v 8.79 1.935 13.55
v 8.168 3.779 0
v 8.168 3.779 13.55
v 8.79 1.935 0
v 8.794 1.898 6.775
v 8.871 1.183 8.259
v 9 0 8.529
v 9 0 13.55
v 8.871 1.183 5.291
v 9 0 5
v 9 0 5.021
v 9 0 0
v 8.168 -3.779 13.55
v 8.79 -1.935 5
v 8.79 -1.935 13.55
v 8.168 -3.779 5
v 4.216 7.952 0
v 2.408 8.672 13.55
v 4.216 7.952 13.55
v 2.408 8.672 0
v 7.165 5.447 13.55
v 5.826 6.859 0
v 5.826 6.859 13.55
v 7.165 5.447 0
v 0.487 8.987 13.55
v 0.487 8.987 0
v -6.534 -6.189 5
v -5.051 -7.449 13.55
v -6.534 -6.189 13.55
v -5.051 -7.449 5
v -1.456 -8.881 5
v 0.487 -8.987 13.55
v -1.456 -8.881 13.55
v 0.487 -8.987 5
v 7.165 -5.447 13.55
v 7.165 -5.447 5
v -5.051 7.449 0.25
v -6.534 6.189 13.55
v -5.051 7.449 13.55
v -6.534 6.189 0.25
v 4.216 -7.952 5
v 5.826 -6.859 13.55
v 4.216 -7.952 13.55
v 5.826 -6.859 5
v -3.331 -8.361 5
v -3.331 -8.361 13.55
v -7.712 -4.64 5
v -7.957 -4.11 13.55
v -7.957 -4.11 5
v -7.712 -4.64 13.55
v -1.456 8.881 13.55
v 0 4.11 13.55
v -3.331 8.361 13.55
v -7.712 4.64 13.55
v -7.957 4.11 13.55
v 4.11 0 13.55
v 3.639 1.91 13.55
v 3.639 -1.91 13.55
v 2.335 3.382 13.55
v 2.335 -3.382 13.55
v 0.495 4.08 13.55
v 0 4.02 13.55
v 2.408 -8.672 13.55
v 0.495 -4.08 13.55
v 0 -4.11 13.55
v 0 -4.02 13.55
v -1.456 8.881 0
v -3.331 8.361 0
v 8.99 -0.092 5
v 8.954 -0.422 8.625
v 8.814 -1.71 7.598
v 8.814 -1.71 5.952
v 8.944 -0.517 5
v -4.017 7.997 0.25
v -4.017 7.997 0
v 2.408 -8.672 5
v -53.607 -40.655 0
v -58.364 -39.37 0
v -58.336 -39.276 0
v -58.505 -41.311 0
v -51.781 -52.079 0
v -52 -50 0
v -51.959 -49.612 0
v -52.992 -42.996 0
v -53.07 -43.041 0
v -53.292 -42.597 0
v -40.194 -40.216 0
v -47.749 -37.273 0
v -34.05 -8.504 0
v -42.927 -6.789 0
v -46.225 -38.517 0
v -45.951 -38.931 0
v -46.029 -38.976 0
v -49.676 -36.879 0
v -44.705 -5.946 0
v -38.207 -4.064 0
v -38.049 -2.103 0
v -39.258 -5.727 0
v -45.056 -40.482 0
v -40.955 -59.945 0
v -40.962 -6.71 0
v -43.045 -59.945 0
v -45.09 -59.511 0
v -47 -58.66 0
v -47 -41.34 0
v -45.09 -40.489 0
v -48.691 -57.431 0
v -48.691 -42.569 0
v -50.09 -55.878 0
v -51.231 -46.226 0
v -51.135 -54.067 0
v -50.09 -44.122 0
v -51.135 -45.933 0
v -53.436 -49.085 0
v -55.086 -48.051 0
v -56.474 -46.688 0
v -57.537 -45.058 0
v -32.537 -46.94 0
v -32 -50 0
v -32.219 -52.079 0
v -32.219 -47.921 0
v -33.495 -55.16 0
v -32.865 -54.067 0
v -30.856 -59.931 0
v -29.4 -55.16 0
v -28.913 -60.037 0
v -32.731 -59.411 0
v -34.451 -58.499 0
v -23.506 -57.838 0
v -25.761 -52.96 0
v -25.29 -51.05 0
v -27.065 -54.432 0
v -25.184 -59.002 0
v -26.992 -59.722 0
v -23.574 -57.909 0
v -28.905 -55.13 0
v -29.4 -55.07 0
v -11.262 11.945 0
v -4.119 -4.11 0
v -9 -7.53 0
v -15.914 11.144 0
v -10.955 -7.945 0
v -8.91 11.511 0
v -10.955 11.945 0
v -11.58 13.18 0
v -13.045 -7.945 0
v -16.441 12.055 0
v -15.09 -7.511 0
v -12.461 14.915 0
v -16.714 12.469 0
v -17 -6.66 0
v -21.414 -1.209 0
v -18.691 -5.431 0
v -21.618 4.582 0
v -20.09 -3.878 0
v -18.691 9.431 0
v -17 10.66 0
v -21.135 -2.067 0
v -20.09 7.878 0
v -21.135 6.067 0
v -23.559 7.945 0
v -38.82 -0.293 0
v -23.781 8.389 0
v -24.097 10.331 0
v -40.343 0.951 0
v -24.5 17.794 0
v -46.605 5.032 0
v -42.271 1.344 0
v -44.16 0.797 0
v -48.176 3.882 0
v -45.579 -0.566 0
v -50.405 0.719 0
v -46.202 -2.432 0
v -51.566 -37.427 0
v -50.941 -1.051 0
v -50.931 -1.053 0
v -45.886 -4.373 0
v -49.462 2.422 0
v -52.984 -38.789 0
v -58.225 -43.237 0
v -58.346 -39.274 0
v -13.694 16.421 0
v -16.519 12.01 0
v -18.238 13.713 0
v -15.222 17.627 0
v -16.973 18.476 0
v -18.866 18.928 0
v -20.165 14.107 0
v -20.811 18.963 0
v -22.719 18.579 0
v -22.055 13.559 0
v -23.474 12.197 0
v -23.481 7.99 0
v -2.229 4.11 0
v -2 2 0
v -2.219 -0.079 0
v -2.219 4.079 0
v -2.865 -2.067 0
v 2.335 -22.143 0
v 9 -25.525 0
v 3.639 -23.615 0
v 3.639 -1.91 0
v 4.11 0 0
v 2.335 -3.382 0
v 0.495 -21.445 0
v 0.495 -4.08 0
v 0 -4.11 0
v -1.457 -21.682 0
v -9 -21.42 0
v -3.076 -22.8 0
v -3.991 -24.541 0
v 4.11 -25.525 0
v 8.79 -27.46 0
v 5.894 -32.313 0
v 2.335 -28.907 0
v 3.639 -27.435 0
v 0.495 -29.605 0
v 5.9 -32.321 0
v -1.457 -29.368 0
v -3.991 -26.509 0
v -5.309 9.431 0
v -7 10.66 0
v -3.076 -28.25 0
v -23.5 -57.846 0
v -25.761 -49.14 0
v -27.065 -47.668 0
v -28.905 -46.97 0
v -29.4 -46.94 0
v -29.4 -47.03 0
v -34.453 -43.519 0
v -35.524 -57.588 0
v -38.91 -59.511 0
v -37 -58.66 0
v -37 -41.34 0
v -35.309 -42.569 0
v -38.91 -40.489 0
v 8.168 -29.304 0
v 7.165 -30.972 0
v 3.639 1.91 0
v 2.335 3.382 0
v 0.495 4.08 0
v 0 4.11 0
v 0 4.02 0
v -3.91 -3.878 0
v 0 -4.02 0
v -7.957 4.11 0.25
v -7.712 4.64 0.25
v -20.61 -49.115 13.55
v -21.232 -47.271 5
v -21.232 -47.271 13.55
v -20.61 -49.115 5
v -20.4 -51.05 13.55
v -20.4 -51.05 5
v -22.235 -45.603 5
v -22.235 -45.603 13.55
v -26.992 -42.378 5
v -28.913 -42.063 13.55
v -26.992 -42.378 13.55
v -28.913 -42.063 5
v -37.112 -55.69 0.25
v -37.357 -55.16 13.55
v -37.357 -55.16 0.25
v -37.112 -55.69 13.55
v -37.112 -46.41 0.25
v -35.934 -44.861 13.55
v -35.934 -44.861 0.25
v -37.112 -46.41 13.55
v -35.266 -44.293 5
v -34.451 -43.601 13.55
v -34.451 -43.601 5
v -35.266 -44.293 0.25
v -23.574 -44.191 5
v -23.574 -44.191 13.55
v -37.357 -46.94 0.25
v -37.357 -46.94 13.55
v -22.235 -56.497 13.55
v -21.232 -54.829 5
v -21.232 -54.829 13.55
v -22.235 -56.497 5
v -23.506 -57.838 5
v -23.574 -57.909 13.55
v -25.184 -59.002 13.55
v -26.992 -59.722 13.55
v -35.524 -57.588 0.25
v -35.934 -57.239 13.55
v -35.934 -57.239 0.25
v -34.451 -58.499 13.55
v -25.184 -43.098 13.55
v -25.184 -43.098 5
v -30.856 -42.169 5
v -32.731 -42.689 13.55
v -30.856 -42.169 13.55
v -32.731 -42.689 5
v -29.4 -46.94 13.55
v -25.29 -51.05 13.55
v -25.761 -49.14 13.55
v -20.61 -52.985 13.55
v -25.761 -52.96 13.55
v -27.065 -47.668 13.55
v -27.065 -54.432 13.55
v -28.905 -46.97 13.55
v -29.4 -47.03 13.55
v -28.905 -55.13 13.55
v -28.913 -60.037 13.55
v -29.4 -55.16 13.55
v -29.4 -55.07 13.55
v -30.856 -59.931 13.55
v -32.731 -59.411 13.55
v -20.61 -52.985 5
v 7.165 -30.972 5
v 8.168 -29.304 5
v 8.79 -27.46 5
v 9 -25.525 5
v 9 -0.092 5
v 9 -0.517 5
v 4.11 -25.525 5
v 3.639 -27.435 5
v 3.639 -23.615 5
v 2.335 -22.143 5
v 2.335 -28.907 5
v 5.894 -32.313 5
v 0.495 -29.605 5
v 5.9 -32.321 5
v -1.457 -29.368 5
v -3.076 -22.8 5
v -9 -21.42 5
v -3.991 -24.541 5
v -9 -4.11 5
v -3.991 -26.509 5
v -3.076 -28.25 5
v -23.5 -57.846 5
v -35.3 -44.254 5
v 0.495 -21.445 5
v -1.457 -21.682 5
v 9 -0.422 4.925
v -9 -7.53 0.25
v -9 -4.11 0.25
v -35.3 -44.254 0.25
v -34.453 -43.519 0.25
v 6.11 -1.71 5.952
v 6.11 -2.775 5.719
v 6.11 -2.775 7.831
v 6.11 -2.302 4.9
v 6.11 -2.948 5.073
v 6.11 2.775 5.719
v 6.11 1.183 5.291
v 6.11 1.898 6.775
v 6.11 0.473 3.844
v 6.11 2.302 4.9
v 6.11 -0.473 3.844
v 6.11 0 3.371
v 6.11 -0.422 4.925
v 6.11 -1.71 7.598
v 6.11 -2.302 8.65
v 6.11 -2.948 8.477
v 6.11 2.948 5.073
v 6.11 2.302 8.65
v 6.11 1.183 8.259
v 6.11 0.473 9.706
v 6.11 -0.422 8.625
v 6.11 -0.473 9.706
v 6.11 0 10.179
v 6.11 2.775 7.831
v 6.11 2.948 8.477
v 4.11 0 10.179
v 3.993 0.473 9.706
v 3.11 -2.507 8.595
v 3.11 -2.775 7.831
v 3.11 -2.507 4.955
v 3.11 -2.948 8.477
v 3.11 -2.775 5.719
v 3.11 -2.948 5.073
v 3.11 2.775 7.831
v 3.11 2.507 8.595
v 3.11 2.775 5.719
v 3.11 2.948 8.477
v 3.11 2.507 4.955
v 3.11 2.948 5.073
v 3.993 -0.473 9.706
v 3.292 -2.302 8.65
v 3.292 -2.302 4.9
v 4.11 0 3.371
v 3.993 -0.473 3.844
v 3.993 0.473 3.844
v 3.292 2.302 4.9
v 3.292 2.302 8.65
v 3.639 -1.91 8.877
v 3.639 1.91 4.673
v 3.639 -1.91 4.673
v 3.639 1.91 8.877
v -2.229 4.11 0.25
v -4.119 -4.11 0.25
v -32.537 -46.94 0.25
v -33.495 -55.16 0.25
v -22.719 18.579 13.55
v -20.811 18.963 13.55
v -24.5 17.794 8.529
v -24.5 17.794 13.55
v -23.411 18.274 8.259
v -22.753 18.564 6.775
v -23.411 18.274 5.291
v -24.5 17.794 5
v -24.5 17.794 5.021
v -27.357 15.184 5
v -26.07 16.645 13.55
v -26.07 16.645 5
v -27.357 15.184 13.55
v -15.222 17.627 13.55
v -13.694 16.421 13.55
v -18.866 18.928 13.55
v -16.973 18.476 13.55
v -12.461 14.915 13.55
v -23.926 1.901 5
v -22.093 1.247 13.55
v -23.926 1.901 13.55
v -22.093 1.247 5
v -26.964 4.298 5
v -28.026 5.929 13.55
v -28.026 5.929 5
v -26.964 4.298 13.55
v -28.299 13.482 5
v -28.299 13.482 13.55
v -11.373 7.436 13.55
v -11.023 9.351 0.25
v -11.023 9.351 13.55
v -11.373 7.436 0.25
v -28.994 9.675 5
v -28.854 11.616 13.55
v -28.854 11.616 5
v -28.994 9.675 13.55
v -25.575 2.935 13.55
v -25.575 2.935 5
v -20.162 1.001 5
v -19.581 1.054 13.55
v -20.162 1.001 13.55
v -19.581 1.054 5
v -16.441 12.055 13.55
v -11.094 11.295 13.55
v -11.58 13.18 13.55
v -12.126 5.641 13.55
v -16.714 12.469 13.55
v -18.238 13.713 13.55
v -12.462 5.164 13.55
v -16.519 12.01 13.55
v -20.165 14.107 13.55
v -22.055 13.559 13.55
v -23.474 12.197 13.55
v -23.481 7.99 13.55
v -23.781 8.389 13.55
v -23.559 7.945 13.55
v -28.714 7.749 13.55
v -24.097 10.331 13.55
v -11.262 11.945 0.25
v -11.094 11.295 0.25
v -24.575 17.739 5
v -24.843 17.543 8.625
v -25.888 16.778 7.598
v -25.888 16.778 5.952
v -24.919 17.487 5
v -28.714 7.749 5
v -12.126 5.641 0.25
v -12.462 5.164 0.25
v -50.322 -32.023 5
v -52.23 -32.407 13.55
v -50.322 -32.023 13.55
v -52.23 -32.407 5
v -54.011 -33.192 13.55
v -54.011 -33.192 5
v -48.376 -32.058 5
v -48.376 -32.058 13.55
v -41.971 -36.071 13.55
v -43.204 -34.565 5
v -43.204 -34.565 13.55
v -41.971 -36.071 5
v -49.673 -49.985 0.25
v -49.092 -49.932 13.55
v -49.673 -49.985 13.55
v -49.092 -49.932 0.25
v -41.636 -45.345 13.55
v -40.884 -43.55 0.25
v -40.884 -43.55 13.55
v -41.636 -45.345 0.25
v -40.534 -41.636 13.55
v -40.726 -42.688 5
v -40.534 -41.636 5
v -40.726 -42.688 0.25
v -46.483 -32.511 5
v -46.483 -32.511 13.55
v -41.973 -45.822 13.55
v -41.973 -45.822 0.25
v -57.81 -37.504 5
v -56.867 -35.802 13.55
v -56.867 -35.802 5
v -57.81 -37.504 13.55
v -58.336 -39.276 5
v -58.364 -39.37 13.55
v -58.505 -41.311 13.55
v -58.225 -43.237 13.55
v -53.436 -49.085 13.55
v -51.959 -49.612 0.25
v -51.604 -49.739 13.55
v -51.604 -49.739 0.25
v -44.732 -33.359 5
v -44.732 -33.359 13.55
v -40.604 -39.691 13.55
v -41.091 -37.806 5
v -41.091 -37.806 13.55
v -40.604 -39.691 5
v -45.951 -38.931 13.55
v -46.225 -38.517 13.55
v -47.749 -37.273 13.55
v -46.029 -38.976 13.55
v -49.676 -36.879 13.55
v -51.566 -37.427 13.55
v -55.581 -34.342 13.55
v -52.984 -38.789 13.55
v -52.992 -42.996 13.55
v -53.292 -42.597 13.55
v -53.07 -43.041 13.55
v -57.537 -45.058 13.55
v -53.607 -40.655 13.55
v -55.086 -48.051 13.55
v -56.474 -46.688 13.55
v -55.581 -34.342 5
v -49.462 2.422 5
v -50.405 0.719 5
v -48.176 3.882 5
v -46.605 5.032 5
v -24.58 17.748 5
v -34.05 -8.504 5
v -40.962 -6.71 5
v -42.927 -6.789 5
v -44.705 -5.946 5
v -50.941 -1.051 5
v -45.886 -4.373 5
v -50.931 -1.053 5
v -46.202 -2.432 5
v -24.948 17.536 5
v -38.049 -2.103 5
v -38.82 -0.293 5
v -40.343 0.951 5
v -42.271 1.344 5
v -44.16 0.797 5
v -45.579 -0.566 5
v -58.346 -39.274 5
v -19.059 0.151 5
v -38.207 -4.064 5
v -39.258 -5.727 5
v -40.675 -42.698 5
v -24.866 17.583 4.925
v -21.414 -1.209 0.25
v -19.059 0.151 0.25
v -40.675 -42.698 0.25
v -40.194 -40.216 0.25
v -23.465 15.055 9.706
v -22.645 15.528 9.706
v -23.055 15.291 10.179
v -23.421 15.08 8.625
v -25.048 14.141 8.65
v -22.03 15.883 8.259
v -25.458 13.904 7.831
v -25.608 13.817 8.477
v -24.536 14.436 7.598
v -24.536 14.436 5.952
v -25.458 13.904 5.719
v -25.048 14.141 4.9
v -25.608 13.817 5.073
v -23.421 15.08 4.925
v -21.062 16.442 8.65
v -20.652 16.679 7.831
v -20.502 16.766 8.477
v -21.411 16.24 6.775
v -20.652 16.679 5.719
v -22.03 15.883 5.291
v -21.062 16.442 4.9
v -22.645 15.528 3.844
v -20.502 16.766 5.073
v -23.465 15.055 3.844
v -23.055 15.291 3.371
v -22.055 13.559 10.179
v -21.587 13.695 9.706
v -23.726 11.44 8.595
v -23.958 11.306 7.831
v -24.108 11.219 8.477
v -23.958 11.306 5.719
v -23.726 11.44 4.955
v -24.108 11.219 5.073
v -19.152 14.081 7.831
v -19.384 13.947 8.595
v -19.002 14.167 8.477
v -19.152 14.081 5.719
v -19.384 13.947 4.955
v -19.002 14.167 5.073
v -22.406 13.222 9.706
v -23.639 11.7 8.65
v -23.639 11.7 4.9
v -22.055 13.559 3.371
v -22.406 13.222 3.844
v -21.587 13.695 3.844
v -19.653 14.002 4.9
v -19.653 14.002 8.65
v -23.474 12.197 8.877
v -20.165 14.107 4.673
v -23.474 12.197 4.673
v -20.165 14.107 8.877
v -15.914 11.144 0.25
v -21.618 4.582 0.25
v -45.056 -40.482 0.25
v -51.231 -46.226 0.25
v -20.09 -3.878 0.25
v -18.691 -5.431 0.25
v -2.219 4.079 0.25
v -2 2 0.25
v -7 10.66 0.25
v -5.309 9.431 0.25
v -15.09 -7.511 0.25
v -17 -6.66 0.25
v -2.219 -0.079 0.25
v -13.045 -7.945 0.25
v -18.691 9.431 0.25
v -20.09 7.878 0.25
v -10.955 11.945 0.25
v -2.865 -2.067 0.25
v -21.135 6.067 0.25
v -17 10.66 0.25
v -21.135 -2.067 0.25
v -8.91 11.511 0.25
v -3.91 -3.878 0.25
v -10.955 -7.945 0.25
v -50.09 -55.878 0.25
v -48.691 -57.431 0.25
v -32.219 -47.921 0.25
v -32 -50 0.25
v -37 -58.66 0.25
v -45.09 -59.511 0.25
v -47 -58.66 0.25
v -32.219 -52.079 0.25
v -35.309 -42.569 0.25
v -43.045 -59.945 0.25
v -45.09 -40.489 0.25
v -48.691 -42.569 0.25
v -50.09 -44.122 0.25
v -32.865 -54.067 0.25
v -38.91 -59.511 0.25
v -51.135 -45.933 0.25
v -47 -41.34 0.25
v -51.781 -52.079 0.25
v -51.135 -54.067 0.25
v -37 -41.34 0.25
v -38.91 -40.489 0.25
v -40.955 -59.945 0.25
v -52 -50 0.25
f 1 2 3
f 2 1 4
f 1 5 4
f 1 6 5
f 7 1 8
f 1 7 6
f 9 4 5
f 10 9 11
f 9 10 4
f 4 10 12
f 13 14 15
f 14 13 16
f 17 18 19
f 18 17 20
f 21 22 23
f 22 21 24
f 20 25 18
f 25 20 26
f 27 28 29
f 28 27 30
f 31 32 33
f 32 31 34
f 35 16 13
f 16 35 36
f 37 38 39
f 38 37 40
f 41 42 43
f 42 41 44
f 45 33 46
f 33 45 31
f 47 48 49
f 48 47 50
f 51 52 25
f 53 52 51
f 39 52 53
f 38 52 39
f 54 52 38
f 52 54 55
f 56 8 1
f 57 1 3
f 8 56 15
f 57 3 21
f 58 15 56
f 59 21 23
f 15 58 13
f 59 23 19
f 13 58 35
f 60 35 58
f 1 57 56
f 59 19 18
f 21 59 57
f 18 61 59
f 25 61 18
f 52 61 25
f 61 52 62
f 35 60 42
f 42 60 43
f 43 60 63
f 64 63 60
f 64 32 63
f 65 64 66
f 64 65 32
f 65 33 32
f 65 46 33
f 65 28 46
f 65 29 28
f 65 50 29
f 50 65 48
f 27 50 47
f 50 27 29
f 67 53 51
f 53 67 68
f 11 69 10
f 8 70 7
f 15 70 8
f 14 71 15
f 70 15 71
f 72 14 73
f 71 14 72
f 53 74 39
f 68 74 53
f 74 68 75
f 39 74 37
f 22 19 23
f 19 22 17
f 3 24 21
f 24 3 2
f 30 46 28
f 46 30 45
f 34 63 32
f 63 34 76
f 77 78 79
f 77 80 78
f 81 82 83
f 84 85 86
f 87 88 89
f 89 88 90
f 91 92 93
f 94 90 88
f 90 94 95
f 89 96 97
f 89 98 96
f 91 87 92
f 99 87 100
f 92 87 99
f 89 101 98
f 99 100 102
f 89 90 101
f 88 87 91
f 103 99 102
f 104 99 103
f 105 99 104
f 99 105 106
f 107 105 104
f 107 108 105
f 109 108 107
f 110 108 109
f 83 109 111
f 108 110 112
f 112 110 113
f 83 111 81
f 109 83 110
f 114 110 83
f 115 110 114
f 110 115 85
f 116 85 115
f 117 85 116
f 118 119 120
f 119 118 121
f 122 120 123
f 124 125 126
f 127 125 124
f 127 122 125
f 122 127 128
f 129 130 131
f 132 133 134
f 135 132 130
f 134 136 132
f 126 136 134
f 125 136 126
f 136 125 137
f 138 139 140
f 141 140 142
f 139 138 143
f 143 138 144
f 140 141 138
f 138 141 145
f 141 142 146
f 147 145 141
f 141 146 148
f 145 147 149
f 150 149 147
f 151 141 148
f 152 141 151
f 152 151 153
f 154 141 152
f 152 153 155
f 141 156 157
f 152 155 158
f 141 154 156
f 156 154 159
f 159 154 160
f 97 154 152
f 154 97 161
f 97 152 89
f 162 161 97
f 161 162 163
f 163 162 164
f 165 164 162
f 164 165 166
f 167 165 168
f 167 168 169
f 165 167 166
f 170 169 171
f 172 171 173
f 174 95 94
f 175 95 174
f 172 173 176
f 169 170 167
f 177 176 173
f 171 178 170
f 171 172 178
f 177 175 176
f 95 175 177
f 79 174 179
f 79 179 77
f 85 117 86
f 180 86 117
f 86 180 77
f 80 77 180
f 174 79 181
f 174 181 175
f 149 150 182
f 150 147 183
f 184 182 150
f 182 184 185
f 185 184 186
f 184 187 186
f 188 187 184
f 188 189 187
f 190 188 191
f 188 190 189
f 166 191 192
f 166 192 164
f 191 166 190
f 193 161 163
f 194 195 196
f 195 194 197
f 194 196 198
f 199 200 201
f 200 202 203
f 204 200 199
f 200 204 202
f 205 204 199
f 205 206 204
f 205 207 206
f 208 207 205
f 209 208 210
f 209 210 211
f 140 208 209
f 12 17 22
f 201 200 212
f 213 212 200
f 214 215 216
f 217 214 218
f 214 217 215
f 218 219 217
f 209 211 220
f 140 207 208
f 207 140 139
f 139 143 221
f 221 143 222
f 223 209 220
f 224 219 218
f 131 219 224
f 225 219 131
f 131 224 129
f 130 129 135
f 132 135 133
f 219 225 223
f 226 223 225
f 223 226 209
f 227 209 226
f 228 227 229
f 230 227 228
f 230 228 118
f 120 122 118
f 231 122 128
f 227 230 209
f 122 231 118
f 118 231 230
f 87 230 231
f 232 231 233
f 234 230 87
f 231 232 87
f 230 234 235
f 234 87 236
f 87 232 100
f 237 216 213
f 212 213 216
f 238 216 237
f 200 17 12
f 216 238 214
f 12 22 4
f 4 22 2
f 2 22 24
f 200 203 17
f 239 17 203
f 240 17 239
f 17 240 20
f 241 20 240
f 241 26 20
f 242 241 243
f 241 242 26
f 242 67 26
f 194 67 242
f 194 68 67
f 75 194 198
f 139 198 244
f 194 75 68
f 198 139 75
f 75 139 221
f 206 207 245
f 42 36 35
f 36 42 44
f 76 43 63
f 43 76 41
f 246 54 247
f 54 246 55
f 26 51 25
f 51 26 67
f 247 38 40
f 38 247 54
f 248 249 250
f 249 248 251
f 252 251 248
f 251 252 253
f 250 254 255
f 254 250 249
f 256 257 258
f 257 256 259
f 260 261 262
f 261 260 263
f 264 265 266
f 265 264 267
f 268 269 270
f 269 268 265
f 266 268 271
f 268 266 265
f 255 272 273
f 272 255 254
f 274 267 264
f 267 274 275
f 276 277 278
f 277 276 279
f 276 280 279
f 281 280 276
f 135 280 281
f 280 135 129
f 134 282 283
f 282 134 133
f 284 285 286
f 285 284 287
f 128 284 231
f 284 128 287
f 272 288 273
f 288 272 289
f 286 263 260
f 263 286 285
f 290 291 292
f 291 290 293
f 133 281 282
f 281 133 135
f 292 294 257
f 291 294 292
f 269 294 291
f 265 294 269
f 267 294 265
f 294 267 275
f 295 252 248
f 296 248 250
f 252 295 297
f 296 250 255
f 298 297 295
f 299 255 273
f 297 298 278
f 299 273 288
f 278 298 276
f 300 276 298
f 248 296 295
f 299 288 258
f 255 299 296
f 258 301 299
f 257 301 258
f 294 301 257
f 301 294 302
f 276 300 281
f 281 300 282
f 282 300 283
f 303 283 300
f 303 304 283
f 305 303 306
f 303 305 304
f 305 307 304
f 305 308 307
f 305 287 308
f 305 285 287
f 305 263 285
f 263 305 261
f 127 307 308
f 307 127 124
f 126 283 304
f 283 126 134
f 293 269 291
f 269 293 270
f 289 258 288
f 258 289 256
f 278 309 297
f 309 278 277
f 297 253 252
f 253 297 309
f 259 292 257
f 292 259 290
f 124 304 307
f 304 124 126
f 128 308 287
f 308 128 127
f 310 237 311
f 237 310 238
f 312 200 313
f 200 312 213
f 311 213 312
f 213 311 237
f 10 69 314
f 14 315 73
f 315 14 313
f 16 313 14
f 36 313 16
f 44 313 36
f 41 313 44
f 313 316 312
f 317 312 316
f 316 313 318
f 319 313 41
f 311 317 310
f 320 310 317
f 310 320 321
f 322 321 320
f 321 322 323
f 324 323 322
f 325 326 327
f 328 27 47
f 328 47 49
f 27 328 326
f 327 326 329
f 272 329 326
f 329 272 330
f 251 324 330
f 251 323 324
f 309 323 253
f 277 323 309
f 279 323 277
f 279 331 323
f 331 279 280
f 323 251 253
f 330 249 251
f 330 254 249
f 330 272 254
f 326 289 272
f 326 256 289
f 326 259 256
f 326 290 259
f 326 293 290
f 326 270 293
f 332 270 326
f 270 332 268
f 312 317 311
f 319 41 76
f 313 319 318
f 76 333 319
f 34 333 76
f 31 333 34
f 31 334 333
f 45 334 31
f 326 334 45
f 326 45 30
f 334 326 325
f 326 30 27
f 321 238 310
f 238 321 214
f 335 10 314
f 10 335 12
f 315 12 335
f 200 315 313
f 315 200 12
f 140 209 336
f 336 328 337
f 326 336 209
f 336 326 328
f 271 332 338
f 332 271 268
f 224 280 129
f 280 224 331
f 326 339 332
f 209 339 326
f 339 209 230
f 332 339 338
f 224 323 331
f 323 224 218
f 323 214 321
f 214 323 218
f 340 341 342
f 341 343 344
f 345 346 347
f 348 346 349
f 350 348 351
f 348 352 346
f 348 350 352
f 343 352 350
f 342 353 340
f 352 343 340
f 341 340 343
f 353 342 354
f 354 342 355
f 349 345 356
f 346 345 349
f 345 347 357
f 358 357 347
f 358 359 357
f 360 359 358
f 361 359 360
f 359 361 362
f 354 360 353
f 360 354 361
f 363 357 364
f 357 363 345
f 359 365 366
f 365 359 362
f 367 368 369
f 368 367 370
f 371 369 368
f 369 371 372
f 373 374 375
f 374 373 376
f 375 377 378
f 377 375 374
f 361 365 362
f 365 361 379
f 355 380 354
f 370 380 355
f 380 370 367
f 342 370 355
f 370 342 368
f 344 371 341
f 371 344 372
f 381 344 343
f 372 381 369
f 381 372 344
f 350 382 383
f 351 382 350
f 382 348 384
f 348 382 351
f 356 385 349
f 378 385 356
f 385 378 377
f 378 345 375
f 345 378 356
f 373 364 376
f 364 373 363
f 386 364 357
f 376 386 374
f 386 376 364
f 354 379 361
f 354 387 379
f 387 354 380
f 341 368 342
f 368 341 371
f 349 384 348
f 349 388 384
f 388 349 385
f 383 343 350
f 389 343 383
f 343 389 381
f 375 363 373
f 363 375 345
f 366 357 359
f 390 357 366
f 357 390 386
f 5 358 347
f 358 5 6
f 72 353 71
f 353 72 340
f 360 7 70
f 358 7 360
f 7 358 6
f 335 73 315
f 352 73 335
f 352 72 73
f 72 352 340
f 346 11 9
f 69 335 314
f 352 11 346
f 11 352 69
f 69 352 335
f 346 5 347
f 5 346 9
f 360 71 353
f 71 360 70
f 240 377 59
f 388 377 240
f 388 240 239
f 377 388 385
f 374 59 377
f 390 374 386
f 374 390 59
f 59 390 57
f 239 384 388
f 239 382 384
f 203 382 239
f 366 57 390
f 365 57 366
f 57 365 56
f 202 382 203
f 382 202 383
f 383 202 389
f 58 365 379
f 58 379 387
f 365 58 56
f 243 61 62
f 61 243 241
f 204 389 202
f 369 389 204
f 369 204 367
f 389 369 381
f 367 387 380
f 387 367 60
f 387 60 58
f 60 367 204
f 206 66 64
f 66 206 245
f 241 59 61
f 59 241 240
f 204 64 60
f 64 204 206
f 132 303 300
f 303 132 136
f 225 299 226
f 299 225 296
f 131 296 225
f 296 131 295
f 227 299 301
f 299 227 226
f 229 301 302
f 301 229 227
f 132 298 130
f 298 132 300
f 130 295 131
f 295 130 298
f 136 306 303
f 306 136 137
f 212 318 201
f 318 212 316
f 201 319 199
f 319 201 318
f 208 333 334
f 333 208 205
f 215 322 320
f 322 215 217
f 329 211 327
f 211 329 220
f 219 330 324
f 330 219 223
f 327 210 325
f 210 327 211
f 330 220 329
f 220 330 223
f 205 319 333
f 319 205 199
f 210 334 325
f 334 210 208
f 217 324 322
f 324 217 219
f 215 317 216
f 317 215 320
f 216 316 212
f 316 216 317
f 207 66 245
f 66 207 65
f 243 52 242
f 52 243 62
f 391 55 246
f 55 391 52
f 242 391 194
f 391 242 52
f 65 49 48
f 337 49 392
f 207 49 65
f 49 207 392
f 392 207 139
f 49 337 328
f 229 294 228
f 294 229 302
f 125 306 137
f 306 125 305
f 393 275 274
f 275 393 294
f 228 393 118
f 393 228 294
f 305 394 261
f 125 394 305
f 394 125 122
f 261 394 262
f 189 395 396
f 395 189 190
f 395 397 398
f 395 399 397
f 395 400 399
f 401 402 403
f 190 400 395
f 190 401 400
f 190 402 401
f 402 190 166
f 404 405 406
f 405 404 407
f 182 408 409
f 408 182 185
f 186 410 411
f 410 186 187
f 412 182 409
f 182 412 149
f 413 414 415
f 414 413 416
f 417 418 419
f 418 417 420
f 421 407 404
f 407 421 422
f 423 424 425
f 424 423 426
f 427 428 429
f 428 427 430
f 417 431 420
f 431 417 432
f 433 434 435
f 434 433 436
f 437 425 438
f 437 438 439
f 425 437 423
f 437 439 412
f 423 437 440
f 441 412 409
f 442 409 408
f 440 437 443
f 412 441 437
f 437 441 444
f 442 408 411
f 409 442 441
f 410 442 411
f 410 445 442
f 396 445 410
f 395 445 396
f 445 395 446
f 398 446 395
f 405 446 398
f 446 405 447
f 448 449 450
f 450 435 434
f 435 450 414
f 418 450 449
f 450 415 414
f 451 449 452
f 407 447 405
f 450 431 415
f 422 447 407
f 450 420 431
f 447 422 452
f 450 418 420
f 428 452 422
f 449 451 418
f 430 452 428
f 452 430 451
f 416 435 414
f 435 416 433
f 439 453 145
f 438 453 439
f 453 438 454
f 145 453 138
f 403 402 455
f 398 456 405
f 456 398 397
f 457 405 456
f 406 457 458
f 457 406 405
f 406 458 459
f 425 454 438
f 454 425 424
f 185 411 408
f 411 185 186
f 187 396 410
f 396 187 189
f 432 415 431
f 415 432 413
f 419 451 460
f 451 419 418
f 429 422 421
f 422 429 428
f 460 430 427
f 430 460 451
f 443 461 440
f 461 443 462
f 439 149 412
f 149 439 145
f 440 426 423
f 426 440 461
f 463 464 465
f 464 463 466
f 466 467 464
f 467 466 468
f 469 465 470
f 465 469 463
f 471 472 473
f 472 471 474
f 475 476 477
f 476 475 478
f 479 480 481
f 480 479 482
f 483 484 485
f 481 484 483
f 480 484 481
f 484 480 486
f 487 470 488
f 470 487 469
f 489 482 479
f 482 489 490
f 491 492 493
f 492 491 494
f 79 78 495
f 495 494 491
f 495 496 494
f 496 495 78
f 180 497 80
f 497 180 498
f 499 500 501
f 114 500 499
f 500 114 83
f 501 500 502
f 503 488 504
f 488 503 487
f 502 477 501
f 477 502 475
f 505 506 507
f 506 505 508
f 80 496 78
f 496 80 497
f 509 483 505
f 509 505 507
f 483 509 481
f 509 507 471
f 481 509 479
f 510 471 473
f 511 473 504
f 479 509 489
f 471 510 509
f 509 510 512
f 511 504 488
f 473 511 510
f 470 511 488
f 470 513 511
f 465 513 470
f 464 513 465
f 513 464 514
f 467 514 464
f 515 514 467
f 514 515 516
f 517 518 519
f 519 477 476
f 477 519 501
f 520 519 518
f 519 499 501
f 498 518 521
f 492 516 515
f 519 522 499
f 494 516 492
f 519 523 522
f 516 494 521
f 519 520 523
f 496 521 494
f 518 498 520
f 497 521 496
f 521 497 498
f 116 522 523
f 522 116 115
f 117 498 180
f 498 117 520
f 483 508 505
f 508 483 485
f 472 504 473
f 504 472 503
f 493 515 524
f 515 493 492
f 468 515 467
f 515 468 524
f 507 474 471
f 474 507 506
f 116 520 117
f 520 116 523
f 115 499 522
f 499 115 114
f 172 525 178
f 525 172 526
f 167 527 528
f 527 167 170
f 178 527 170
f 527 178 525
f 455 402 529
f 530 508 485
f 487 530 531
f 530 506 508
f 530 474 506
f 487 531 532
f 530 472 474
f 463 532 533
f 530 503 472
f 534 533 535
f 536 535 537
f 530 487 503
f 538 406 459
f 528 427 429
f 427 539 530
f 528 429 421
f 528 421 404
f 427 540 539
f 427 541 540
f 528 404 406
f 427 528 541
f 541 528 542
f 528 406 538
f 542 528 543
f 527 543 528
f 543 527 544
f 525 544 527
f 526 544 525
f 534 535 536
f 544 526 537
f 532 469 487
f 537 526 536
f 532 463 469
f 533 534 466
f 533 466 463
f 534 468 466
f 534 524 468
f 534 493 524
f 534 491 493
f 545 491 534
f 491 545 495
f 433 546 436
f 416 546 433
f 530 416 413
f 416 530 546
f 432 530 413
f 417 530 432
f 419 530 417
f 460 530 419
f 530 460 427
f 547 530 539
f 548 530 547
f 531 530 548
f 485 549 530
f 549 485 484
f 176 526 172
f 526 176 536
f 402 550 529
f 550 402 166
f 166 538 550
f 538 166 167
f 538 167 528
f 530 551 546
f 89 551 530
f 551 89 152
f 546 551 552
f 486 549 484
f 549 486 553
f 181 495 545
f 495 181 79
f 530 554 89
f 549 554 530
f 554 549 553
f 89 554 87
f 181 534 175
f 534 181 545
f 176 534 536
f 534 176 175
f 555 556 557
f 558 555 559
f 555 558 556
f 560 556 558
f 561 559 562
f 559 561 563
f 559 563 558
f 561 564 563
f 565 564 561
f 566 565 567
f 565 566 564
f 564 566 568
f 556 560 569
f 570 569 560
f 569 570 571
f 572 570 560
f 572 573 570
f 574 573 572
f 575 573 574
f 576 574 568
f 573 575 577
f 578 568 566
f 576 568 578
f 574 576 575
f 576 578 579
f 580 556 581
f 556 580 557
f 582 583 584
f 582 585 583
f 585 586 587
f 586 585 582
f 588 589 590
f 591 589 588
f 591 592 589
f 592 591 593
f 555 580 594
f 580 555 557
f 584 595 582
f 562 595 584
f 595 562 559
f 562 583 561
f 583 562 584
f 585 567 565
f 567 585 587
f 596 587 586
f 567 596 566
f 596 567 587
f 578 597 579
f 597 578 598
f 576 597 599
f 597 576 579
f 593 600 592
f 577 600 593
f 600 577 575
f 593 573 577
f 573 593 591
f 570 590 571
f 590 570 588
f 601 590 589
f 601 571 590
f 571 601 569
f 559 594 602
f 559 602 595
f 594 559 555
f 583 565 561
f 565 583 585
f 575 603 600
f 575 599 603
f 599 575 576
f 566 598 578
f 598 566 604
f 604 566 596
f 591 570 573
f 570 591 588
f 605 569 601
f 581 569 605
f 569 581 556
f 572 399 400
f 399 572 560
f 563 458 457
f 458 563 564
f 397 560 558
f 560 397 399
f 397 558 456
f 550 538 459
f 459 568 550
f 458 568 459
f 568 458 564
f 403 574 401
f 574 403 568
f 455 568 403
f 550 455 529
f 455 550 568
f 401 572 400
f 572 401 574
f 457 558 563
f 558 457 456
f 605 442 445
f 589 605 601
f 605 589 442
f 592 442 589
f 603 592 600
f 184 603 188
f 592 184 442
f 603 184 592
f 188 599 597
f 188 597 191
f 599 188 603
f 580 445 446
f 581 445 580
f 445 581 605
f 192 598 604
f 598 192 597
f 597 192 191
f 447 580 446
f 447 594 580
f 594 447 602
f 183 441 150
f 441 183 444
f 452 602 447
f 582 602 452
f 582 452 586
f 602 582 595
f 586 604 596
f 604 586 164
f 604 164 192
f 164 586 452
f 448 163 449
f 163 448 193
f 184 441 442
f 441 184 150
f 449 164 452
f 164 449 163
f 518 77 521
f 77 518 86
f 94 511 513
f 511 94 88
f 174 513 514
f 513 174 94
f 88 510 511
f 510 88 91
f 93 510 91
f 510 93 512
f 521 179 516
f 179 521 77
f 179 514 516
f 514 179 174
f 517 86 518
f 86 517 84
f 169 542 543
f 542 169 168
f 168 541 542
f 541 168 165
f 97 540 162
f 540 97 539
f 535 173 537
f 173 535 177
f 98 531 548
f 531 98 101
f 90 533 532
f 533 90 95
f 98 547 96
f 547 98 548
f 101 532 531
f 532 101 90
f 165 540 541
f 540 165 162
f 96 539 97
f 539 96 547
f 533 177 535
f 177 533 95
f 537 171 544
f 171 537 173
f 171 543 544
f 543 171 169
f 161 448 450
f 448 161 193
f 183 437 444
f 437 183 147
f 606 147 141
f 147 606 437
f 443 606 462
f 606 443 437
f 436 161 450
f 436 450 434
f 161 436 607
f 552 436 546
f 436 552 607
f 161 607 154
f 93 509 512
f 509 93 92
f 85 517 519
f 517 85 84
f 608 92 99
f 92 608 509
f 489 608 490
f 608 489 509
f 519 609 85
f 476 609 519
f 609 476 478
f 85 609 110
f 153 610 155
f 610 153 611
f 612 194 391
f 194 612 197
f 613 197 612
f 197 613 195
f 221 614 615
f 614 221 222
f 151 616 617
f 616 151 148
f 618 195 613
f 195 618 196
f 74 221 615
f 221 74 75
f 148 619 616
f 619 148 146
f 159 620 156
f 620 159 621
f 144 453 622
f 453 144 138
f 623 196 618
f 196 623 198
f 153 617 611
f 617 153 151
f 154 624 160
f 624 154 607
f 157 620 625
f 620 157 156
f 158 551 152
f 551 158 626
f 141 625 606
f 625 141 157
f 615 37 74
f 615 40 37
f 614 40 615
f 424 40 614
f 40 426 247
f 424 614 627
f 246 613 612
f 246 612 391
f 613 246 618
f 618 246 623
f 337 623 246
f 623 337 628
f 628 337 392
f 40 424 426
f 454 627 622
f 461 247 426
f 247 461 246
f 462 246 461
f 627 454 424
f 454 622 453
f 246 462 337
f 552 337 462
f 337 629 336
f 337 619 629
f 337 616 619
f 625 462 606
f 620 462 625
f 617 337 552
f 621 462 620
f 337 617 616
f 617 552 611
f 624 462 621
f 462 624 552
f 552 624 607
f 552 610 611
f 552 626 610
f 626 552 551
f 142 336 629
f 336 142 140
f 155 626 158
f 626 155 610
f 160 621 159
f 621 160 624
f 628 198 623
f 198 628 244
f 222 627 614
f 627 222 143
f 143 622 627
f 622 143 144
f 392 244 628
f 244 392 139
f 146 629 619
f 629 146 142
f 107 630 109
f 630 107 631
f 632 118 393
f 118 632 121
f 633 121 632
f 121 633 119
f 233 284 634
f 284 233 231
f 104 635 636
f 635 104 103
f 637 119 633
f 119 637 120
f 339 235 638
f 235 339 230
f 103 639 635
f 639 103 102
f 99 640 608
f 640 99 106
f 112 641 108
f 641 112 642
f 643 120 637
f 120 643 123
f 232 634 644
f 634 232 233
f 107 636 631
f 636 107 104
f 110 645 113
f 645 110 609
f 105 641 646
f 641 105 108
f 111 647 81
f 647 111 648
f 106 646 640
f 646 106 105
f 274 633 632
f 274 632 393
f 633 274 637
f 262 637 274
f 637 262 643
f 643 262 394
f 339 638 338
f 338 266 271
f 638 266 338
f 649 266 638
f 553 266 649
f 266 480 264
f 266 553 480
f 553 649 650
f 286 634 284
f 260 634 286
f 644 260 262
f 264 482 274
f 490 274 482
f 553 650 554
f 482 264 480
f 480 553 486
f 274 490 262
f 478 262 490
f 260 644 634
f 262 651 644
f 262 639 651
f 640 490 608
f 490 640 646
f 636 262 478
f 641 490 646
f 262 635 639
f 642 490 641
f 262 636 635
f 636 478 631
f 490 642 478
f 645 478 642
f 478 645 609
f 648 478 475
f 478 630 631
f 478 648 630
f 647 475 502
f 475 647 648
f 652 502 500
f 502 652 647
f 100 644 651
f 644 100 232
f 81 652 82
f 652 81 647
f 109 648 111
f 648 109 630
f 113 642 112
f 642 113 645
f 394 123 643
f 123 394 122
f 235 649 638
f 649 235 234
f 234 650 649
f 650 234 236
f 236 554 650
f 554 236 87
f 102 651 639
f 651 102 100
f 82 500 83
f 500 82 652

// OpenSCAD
// Y bearing Idler bracket(s) with belt tensioner
// Michel Pollet <buserror@gmail.com>
// 
// inspired by http://www.thingiverse.com/thing:12299
// inspired by http://www.thingiverse.com/thing:12148

E = 0.01;
bar_width = 18;
bar_thickness = 5;
bushing_diameter = 18;

bearing_and_belt_diameter = 28;

//m8_diameter = 8;
m8_diameter = 7.8 + 0.42;

double_bearings_and_washer = 17.1;

total_thickness = bar_thickness + (double_bearings_and_washer/2);

// don't change these
bar_x_offset = 3.4 + 26;
bar_y_offset = 30.05+21;

top_bar_to_bearing_distance = bar_y_offset / 2;
//top_bar_to_bearing_distance = 12 + (bearing_and_belt_diameter/2);

bottom_angle = atan((bar_y_offset-top_bar_to_bearing_distance) / bar_x_offset);
bottom_bar_length = bar_x_offset / cos(bottom_angle);
echo("bottom angle", bottom_angle, bottom_bar_length);

spikey_first_layer_support = 1;
use_brass_insert_for_tension = 0;
use_m3_nut_for_tension = 1;

brass_insert_diameter = 4;
m3_diameter = 3.0 + 0.42;
m3_nut_diameter = 5.55;
m3_nut_height = 2.5;
demo = 0;

ybract();

if (demo == 0) {
	translate([-20,10,0]) rotate([0,0,90+30])
		mirror([0,1,0])
			ybract();
	
	if (spikey_first_layer_support) {
		translate([-12, 2, 0])
			cylinder(r=10, h = 0.25);
		translate([-42, -50, 0])
			cylinder(r=10, h = 0.25);
	}
}
if (demo == 1) {
	% translate([0, -top_bar_to_bearing_distance, bar_thickness])
		cylinder(r = bearing_and_belt_diameter / 2, h = 10);
}

module ybract() difference() {
	union() {
	  // top circle
		cylinder(r=bushing_diameter/2, h=total_thickness);
	
		// bottom circle
		translate([-bar_x_offset, -bar_y_offset, 0])
			cylinder(r=bushing_diameter/2, h=total_thickness);
	
		// middle circle
		translate([0,  - top_bar_to_bearing_distance, 0])
			cylinder(r=bushing_diameter/2, h=bar_thickness);
	
		// bar between the circles
		translate([-bar_width/2,-top_bar_to_bearing_distance, 0])
			cube([bar_width, top_bar_to_bearing_distance, bar_thickness]);
	
	//	translate([-(bar_x_offset-(m8_diameter/2)*cos(bottom_angle)), 
	//			-(bar_y_offset - (m8_diameter/2)*sin(bottom_angle)), 0])
		translate([-bar_x_offset, -bar_y_offset, 0])
			rotate(a=[0,0,bottom_angle])
		translate([0,-bar_width/2,0])
			cube([bottom_bar_length, bar_width, bar_thickness]); 
	}

	translate([0,0,-E])
		cylinder(r=m8_diameter/2, h=total_thickness + (2*E));
	translate([0,0, total_thickness / 2])
		rotate([-90,0,-90]) {
			if (use_brass_insert_for_tension == 1)
				polyhole(d = brass_insert_diameter, h = 12);
			if (use_m3_nut_for_tension == 1) {
				polyhole(d = m3_diameter, h = 12);
				rotate([0,0,30]) 
					translate([0,0,(m8_diameter/2)-1])
					nut(d = m3_nut_diameter, h = m3_nut_height + 0.5);
			}
		}
	translate([-bar_x_offset,-bar_y_offset,-E])
		cylinder(r=m8_diameter/2, h=total_thickness + (2*E));
	translate([0,0 - top_bar_to_bearing_distance, -E])
		cylinder(r=m8_diameter/2, h=total_thickness + (2*E));
	
	// make slots
	translate([-bushing_diameter, - m8_diameter/2, -E])
		cube([bushing_diameter, m8_diameter, total_thickness + (2*E)]);
	
	translate([-bar_x_offset - bushing_diameter, -bar_y_offset - m8_diameter/2, -E])
		cube([bushing_diameter, m8_diameter, total_thickness + (2*E)]);

}



module nut(d,h,horizontal=true){
cornerdiameter =  (d / 2) / cos (180 / 6);
cylinder(h = h, r = cornerdiameter, $fn = 6);
if(horizontal){
for(i = [1:6]){
	rotate([0,0,60*i]) translate([-cornerdiameter-0.2,0,0]) rotate([0,0,-45]) cube(size = [2,2,h]);
}}
}

// Based on nophead research
module polyhole(d,h) {
    n = max(round(2 * d),3);
    rotate([0,0,180])
        cylinder(h = h, r = (d / 2) / cos (180 / n), $fn = n);
}

module roundcorner(diameter){
	difference(){
		cube(size = [diameter,diameter,99], center = false);
		translate(v = [diameter, diameter, 0]) cylinder(h = 100, r=diameter, center=true);
	}
}
